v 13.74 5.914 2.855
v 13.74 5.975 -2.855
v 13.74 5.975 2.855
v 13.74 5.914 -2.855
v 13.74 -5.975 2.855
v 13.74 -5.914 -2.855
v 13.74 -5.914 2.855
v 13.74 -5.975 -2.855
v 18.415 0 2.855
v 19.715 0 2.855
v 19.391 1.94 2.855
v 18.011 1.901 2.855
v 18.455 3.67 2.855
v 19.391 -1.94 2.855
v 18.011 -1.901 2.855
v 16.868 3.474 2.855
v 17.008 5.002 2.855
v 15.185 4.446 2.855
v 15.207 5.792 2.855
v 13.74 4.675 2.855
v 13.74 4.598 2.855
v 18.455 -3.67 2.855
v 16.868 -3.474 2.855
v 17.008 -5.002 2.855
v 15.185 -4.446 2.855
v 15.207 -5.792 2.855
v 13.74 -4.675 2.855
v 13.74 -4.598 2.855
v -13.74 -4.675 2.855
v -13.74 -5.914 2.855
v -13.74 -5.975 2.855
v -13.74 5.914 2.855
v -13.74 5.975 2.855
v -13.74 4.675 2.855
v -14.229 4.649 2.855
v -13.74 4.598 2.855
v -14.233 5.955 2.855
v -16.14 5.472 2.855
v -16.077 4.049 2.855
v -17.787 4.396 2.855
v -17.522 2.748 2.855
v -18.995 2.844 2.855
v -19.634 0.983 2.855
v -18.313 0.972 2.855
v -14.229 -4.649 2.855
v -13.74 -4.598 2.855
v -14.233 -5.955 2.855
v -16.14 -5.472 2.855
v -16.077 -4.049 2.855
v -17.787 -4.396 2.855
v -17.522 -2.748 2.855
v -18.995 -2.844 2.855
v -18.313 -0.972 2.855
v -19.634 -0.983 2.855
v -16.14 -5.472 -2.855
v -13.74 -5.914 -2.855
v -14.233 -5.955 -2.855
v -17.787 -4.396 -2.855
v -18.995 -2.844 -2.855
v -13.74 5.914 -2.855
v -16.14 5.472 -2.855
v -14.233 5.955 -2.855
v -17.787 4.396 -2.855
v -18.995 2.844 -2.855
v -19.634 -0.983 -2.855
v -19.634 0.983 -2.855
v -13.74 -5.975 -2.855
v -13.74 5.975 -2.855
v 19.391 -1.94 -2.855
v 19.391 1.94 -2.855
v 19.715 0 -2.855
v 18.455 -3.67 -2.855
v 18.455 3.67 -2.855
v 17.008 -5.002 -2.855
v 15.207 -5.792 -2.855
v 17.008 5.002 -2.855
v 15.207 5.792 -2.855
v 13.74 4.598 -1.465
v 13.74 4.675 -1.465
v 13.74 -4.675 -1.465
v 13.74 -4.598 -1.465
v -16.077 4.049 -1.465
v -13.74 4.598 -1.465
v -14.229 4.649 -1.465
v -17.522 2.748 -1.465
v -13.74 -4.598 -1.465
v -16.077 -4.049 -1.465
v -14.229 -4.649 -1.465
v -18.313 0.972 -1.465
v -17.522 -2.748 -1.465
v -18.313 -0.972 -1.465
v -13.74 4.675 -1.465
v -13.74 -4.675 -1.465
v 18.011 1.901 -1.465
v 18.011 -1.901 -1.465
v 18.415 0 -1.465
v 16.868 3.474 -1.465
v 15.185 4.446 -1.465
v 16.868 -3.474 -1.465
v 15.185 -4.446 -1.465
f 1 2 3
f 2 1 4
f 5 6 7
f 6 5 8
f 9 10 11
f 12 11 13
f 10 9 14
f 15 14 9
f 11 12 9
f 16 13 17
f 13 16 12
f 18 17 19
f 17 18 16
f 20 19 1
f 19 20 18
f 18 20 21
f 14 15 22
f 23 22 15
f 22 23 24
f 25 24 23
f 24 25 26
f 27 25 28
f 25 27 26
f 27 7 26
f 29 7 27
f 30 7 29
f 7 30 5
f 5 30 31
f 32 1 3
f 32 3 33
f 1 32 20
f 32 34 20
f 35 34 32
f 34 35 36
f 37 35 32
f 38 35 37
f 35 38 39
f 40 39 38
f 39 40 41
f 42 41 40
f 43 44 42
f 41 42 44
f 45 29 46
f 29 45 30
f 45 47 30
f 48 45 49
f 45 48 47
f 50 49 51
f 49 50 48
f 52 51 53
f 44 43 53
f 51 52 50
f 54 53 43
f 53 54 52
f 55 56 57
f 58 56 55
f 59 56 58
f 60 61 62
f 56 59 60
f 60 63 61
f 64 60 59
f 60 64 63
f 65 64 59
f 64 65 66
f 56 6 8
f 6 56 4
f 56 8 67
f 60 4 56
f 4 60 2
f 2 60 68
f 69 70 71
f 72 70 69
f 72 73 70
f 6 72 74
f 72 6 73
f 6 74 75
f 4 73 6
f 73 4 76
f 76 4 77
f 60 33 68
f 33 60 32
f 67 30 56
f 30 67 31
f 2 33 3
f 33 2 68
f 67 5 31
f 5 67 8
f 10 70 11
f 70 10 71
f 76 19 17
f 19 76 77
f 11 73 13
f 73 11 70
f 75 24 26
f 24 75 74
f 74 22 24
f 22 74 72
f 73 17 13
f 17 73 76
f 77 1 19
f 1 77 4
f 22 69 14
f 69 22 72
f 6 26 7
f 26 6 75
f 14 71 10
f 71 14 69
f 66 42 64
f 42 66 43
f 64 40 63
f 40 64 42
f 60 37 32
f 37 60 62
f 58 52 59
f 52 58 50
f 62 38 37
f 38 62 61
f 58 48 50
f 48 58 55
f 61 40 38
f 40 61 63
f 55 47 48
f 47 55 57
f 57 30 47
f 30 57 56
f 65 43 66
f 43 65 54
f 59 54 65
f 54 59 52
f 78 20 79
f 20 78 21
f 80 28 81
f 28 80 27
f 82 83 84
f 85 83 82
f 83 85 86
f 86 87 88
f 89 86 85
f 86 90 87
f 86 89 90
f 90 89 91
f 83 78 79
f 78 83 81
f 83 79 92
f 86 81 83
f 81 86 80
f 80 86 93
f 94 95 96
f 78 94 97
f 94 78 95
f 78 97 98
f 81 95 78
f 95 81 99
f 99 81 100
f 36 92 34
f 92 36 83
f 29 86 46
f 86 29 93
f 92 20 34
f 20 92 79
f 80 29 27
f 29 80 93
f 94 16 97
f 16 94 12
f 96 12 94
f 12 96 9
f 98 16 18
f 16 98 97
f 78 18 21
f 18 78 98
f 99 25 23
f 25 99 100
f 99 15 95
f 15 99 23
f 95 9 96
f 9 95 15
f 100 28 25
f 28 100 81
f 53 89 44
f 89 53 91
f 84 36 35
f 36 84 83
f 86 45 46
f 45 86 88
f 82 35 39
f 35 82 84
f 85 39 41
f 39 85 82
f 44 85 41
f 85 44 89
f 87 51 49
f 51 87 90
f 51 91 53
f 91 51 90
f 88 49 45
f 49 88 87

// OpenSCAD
//39.43mm long x
max_x=39.43;
//10mm min wide y
//11.95mm max wide y
max_y=11.95;
min_y=10;

//5.71deep
max_z=5.71;
//1.39mm bottom depth
bottom=1.39;
// wall 1.30
wall=1.30;
// window 27.14


//spoke outside to outside 23.83
//spoke inside to inside 14.82
//spoke width 4.51 y
//spoke width 4.74 x
//long spoke 13.11 z
//long spoke start 1.86mm from edge y
//short spoke 12.13 z
//spoke joined 6.38 z
//spoke gap 1.5 y
//short spoke nodule start 8mm
//short spoke max nodule x 2.44

module windowthing()
{
	difference() {
		base_shape(max_x,max_y,max_z);
		translate([0,0,bottom])
			base_shape(max_x - 2*wall, max_y - 2*wall, max_z);
	}
}

module base_shape(x,y,z)
{
	cube([x-y,y,z], center = true);
	translate([x/2 - y/2,0,0])
   		cylinder(h=z,r=y/2,center=true);
	translate([-x/2 + y/2,0,0])
   		cylinder(h=z,r=y/2,center=true);
}

windowthing();
